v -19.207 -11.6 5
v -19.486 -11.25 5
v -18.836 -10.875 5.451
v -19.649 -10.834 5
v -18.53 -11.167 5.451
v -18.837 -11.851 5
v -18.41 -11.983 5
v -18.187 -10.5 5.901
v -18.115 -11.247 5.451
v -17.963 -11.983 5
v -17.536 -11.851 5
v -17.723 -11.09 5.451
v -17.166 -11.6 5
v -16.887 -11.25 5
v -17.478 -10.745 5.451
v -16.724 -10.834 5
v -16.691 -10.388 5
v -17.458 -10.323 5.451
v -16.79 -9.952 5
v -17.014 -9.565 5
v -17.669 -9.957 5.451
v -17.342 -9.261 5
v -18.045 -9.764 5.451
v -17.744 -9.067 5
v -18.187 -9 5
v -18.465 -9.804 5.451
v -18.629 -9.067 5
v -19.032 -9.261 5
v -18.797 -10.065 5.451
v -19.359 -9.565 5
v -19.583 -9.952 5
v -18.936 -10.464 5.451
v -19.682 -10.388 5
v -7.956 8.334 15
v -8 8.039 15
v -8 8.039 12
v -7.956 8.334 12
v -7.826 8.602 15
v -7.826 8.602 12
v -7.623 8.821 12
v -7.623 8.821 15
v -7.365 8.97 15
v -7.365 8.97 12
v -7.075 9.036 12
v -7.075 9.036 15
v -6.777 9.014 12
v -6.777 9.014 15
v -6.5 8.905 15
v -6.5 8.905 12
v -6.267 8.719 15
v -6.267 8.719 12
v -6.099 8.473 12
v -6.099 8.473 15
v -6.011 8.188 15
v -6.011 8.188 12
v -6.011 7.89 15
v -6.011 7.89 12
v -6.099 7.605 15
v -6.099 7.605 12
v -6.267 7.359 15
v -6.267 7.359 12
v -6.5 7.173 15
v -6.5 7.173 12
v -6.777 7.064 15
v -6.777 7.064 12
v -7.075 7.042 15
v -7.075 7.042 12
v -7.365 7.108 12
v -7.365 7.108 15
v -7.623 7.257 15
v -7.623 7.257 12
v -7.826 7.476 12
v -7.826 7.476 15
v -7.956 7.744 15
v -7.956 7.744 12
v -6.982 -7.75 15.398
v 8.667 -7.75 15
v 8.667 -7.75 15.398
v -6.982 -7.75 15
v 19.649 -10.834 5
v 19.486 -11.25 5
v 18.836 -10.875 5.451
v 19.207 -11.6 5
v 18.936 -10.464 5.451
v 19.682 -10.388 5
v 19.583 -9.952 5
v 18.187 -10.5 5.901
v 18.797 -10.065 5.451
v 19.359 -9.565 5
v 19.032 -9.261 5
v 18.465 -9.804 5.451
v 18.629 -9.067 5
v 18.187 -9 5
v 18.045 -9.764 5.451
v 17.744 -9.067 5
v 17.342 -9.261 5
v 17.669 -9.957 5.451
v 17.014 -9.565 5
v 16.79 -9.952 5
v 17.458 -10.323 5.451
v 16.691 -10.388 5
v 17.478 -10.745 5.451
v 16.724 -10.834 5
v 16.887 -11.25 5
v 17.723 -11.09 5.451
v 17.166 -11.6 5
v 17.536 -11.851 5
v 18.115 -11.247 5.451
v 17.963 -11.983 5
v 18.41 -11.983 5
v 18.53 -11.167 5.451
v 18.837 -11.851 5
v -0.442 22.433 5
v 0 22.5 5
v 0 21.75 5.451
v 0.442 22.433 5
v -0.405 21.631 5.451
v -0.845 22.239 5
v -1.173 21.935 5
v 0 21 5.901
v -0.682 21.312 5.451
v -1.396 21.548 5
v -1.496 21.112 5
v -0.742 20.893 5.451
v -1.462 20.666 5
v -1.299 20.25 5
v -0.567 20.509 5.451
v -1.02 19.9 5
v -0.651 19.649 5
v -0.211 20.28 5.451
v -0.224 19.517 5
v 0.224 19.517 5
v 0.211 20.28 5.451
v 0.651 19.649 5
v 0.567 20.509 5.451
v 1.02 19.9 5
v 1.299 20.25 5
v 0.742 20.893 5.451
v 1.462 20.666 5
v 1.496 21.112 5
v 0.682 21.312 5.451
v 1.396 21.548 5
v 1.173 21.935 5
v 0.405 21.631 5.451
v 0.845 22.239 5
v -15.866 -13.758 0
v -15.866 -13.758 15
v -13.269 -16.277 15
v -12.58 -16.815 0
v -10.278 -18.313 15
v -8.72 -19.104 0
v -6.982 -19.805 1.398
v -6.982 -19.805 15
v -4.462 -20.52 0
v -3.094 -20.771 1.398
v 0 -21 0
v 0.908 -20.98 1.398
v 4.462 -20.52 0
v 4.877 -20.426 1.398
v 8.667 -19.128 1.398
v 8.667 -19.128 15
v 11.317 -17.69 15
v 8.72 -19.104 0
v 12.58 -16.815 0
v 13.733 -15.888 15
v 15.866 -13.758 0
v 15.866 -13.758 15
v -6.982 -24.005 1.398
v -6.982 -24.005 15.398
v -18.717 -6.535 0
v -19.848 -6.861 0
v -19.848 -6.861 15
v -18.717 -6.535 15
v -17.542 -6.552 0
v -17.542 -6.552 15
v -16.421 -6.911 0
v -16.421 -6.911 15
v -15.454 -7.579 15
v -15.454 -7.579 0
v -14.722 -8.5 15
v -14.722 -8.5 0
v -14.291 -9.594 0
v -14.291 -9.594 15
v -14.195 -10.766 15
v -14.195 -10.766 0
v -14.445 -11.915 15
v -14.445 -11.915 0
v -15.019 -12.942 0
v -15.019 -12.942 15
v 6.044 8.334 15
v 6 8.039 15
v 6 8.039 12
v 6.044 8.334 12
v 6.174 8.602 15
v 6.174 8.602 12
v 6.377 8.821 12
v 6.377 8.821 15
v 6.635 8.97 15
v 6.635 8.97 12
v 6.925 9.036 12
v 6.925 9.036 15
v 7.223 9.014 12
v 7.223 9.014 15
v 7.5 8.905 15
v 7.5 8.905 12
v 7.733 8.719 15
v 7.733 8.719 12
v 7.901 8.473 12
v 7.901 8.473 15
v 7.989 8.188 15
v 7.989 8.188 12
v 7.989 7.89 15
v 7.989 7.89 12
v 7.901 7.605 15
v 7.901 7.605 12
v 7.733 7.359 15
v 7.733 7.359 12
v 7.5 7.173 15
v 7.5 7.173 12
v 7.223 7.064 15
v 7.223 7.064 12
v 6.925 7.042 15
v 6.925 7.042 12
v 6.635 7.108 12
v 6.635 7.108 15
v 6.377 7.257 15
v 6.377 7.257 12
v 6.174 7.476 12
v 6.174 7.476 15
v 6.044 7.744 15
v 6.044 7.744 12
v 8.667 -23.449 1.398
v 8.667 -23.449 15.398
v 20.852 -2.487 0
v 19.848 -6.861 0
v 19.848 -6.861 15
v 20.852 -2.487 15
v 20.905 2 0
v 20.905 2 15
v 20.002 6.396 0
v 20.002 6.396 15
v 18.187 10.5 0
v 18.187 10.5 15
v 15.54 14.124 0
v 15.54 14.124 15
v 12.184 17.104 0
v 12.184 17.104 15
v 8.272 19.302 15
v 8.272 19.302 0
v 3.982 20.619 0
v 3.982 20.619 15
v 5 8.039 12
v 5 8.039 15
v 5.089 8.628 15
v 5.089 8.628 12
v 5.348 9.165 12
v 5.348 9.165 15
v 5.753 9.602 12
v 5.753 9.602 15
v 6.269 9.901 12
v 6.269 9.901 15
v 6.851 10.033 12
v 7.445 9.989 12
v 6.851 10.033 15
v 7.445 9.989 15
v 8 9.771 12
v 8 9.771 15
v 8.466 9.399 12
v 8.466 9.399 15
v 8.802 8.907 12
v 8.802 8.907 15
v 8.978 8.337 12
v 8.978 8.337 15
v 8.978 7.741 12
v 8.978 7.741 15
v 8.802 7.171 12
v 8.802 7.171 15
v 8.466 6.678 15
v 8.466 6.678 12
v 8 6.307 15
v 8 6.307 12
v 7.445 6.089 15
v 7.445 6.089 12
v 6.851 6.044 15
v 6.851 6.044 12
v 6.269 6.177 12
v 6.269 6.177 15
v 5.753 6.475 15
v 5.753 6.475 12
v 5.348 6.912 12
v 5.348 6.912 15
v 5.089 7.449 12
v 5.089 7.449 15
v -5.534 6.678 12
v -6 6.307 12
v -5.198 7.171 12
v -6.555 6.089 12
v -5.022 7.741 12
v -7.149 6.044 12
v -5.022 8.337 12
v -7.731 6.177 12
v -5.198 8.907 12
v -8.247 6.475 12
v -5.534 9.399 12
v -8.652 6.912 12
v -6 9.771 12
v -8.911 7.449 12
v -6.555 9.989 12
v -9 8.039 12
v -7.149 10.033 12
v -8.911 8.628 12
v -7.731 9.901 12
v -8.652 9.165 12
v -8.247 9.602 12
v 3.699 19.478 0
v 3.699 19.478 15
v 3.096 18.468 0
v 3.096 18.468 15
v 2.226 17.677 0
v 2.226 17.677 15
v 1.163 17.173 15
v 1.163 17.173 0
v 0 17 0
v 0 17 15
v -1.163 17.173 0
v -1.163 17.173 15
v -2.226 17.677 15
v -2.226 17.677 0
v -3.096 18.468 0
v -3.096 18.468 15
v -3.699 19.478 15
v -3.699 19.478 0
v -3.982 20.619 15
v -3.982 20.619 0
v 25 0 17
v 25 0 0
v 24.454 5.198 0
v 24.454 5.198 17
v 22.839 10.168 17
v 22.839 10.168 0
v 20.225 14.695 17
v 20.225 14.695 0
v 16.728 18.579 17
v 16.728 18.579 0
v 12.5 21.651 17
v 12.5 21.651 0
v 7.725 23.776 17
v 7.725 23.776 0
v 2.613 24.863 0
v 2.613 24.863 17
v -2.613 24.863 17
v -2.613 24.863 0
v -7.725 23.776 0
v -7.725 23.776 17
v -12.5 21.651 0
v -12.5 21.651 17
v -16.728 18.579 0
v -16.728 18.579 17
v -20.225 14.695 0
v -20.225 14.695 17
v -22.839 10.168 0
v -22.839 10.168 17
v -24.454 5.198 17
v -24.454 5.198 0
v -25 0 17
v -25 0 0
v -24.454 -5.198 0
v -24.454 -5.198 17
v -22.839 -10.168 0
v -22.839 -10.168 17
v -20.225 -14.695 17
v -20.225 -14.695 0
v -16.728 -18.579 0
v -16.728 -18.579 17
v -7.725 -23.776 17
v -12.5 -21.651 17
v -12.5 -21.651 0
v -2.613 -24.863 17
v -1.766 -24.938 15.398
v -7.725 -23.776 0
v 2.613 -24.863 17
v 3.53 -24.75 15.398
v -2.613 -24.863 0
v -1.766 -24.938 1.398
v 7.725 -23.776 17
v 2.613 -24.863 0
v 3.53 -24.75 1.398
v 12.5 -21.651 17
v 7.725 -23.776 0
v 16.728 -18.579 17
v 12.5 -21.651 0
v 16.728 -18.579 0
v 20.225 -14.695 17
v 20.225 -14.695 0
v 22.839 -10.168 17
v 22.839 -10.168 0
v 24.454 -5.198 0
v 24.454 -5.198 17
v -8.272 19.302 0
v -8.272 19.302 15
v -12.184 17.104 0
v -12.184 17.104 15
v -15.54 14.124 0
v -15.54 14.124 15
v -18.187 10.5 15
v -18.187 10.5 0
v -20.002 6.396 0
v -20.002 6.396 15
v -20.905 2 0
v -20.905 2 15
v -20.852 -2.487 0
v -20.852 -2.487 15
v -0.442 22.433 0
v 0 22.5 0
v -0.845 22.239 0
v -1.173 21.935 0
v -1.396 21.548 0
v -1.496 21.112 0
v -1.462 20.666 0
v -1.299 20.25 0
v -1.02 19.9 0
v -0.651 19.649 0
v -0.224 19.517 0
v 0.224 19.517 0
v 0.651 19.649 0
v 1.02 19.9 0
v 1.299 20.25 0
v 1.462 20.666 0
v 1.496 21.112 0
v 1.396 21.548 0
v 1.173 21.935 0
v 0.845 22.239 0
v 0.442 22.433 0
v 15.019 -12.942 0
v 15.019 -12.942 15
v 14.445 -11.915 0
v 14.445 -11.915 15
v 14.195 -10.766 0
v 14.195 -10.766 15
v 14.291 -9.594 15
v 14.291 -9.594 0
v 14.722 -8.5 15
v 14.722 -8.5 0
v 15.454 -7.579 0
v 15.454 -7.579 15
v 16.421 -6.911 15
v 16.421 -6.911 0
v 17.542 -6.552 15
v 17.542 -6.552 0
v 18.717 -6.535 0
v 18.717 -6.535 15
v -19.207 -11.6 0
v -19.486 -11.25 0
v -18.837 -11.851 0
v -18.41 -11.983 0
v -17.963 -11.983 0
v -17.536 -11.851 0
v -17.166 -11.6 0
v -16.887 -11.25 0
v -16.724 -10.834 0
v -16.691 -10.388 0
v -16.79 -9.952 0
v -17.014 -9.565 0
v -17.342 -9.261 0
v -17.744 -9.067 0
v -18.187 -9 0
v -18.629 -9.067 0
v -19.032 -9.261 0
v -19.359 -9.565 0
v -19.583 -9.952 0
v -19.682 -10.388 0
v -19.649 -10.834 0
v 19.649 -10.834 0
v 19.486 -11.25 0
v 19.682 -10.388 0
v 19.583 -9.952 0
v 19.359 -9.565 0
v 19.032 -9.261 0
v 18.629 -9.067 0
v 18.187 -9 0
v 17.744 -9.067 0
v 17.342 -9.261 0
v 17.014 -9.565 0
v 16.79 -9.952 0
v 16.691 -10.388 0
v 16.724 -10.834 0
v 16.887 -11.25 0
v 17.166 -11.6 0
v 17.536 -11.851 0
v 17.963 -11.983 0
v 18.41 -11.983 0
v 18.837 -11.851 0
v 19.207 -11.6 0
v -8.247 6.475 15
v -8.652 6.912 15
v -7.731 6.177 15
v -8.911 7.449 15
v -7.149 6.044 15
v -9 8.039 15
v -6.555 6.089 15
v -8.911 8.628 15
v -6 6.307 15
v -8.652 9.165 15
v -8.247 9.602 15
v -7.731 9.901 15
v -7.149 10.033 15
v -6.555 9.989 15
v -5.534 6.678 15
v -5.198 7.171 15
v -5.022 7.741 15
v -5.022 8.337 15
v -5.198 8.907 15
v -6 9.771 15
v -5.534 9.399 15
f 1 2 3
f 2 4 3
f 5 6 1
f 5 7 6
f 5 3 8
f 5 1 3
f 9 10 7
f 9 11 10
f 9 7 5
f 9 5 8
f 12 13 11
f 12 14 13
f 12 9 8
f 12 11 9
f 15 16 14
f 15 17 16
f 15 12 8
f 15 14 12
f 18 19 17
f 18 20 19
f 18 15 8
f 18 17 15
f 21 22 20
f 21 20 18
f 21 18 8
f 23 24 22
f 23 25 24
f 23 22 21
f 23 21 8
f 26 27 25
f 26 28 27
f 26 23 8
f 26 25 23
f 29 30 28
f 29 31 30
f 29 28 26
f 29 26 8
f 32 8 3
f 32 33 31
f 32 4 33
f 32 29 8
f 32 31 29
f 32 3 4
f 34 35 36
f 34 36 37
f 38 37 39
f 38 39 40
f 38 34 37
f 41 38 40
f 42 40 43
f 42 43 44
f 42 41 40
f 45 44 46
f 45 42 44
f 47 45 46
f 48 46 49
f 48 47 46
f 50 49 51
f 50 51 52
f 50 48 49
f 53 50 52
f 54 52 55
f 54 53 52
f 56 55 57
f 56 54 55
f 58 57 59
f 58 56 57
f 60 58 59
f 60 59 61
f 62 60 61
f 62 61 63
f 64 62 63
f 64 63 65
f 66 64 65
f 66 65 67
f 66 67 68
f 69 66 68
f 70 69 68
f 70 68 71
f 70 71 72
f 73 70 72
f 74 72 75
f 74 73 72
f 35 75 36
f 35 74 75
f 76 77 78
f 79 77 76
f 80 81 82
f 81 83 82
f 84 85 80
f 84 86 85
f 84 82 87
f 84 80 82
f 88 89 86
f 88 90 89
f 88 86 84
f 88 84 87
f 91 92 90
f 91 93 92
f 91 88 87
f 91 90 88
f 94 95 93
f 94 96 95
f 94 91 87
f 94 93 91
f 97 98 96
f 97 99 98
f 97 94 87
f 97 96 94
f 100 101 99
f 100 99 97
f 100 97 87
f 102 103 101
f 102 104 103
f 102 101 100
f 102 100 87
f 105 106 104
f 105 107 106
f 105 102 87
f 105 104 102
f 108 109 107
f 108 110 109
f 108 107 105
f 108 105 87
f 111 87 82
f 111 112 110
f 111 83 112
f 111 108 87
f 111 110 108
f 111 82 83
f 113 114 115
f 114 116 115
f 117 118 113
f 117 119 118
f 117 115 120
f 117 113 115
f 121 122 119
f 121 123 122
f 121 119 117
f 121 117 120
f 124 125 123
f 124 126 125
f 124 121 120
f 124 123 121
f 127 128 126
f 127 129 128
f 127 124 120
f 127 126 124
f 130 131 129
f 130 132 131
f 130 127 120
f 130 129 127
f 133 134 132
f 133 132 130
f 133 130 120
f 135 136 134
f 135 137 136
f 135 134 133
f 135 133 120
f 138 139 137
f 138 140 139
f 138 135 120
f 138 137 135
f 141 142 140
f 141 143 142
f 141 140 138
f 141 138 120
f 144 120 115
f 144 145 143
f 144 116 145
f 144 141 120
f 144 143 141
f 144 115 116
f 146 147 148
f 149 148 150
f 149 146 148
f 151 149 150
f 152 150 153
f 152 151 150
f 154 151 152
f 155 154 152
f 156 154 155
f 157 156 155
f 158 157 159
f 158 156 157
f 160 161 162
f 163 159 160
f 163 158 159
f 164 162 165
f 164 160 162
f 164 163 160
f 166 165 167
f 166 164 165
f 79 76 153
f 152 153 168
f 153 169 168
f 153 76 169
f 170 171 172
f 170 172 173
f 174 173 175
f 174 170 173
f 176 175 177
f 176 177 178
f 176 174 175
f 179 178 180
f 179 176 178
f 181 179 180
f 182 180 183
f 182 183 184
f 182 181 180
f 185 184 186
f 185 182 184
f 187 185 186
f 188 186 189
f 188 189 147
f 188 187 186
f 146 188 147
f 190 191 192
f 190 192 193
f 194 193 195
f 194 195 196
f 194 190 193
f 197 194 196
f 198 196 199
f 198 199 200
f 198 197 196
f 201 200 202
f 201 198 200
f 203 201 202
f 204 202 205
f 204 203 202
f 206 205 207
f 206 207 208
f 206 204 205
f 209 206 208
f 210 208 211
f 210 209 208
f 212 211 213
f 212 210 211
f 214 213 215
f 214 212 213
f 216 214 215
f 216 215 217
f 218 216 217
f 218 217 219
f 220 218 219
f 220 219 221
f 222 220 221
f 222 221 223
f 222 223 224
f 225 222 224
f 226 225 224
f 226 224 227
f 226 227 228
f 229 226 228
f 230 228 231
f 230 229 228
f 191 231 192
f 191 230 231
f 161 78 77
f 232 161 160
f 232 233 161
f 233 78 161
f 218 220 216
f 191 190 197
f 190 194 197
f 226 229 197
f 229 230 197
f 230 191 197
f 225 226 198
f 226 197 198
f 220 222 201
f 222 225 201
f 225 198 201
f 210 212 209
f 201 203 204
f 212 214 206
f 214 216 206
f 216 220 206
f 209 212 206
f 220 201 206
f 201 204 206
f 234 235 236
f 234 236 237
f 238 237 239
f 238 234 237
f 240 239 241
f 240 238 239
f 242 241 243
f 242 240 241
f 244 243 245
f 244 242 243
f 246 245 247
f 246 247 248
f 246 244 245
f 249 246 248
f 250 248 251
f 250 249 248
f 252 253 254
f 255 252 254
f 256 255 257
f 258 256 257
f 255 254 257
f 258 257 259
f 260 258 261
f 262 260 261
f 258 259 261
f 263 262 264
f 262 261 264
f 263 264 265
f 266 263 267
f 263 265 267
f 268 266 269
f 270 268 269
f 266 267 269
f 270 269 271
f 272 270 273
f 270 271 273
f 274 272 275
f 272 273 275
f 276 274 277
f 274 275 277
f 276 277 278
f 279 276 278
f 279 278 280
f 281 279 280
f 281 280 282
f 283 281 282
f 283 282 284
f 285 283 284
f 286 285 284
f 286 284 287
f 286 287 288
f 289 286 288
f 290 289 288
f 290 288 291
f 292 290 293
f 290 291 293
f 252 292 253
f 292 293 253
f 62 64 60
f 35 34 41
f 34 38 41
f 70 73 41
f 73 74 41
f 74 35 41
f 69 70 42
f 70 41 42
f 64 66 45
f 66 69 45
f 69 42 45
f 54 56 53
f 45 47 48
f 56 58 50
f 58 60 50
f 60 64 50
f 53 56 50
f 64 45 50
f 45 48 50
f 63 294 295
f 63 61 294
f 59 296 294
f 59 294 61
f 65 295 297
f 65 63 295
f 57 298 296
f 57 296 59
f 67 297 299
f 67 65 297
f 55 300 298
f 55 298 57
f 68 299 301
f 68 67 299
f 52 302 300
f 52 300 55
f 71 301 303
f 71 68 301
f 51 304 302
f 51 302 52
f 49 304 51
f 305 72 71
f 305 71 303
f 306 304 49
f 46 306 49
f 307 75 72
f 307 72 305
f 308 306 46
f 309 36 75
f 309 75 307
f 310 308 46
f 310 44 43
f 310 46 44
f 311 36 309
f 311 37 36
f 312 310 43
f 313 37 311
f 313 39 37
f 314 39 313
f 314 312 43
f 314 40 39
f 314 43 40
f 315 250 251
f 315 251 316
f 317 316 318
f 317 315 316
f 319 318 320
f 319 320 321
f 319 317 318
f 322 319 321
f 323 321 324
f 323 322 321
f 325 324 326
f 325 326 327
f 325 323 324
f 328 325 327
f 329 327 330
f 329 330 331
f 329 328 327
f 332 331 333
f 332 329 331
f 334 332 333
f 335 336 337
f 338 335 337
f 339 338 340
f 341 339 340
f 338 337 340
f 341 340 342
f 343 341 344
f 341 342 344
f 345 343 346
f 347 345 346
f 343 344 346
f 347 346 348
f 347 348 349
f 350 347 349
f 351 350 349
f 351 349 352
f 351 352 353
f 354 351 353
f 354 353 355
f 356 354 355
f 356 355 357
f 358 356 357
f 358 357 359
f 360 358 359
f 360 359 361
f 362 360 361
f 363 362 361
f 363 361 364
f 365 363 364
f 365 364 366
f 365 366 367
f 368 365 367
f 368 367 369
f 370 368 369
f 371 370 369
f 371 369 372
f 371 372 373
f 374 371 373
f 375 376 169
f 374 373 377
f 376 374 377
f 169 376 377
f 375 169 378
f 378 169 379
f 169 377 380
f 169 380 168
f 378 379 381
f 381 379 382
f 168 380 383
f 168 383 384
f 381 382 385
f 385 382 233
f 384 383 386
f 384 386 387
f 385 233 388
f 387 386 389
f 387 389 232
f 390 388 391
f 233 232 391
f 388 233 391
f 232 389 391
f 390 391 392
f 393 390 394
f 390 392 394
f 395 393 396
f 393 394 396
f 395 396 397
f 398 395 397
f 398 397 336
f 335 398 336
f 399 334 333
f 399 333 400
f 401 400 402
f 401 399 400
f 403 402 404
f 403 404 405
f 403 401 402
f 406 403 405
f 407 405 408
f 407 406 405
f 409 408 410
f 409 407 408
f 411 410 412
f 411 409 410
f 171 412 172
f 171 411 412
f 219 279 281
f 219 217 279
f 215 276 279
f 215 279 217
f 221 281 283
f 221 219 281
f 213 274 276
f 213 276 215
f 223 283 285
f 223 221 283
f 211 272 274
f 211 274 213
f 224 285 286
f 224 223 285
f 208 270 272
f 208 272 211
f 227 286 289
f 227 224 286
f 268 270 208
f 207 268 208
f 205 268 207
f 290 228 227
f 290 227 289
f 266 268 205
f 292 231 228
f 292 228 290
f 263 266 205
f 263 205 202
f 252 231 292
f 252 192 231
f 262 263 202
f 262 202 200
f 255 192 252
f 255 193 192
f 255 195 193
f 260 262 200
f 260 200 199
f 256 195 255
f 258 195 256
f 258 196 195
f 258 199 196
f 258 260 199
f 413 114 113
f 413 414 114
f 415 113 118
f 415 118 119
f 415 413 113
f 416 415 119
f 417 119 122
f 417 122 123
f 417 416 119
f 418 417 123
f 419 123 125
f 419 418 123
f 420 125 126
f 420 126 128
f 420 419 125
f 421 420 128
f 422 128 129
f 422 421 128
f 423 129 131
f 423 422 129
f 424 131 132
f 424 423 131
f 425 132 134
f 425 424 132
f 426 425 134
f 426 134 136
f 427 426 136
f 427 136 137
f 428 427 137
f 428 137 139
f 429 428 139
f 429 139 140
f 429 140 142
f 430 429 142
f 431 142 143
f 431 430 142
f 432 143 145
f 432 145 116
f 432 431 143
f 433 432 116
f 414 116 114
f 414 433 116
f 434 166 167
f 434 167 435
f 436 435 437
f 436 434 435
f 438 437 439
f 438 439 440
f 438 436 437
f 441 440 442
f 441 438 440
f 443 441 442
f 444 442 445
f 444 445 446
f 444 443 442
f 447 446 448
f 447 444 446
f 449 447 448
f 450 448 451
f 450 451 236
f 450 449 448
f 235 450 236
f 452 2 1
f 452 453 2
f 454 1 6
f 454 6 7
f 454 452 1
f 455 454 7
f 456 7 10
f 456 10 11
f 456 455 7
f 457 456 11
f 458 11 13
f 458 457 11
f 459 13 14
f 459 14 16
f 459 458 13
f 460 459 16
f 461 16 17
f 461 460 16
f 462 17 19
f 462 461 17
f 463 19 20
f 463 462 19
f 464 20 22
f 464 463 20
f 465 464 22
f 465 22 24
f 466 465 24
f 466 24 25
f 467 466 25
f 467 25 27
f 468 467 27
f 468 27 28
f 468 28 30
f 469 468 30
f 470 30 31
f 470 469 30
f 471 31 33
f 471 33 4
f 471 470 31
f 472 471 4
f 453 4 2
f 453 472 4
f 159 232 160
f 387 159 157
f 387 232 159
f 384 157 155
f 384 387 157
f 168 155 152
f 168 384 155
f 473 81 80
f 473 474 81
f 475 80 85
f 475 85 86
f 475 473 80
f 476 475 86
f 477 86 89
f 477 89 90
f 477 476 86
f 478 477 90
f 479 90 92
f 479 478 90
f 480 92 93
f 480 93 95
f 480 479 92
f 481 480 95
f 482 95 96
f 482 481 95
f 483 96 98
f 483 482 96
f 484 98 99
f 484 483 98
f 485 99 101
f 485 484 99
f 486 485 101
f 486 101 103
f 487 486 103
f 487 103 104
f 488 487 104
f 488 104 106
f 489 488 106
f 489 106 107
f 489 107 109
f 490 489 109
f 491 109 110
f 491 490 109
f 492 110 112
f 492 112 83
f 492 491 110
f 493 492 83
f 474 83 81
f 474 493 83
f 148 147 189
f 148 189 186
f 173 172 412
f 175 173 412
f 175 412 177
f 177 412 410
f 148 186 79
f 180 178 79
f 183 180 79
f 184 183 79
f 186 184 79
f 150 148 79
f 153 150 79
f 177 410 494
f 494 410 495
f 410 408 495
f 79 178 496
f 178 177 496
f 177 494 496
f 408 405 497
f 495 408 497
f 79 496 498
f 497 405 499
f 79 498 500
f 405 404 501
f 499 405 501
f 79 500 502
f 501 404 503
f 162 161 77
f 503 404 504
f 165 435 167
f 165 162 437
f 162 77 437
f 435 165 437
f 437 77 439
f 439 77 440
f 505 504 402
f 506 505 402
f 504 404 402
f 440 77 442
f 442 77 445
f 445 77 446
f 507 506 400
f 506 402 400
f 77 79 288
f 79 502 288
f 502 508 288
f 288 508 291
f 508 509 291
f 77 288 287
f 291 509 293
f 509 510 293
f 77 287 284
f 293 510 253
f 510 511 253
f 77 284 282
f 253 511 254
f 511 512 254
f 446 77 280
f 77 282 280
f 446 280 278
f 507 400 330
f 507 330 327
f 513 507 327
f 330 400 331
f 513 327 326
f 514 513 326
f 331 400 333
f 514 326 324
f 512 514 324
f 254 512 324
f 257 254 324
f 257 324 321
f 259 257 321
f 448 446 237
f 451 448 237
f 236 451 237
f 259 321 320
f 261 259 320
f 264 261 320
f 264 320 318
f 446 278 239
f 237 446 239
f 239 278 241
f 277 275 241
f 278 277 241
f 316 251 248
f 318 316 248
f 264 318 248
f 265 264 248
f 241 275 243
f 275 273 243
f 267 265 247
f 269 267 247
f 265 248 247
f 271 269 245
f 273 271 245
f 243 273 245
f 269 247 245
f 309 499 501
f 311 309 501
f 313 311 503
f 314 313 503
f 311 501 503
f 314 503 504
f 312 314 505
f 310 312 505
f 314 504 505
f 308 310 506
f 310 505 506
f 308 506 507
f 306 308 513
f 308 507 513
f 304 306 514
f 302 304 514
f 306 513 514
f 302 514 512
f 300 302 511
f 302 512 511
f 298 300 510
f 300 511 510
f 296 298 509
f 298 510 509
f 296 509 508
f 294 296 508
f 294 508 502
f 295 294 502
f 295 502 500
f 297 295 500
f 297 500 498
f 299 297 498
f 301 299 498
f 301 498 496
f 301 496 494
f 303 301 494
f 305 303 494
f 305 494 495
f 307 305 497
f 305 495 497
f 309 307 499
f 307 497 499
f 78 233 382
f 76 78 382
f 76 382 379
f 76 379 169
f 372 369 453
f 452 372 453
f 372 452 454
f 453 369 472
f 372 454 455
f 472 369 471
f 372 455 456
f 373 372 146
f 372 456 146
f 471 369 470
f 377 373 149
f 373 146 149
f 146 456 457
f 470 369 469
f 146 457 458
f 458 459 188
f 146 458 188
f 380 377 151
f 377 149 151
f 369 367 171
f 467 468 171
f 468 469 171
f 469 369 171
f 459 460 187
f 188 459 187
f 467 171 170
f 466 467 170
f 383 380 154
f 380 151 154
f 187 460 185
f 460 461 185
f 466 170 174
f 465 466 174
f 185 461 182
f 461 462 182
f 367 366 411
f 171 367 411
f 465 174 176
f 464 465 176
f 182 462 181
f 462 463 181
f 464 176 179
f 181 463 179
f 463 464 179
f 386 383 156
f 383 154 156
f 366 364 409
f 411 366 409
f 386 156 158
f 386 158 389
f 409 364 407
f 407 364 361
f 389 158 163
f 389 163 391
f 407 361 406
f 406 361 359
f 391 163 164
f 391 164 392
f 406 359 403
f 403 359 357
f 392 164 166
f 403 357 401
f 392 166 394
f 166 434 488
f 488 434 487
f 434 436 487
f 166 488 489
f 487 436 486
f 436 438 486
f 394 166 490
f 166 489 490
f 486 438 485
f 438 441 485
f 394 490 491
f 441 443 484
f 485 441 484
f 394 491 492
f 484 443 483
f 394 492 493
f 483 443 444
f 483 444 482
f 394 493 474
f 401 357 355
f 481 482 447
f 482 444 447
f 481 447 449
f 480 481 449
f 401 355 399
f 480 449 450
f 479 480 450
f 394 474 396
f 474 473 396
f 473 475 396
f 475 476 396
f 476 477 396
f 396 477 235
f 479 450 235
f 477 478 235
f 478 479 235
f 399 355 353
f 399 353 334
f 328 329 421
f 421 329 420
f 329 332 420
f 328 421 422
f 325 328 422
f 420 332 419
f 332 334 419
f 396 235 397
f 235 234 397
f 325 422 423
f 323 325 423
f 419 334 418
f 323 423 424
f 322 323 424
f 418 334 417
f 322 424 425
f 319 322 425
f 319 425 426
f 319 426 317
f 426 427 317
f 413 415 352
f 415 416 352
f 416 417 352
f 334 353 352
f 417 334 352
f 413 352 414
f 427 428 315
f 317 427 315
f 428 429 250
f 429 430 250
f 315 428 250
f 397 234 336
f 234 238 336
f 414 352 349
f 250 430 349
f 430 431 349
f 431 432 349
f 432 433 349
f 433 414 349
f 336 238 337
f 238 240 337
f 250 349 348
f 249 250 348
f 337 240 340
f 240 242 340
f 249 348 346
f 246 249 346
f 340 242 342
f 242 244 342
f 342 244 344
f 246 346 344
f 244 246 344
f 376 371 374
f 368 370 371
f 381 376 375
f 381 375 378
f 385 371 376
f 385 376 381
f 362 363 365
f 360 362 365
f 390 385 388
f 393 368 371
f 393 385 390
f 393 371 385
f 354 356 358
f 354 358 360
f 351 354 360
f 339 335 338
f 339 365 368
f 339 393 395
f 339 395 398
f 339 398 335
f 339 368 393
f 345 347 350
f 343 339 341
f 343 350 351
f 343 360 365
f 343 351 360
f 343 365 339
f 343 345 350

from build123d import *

# Parameters (mm, degrees)
SKETCH1_R           = 25
BOSS_EXTRUDE1_DEPTH = 17
CIRPATTERN1_COUNT   = 3
SKETCH14_W          = 15.649879363
SKETCH14_H          = 14
CUT_EXTRUDE2_DEPTH  = 17.25
CUT_EXTRUDE3_DEPTH  = 15
SKETCH16_R          = 2
SKETCH16_R_2        = 1
BOSS_EXTRUDE2_DEPTH = 3


with BuildPart() as part:
    # Sketch1 → Boss-Extrude1 (new body)
    with BuildSketch(Plane.XY):
        Circle(SKETCH1_R)
    extrude(amount=BOSS_EXTRUDE1_DEPTH)

    # Sketch12 → Ø3.0mm Dowel Hole1 (revolve, cut)
    with BuildSketch(Plane(origin=(0, 21, 0), x_dir=(0, 1, 0), z_dir=(1, 0, 0))):
        Polygon((0, 0), (0, 5.901290929), (1.5, 5), (1.5, 0), align=None)
    f_3_0mm_dowel_hole1 = revolve(axis=Axis((0, 21, -6.35), (0, 0, 1)), mode=Mode.SUBTRACT)

    # CirPattern1: Ø3.0mm Dowel Hole1 ×3 about axis
    cirpattern1_axis = Axis((0, 0, 0), (0, 0, 1))
    for i in range(1, CIRPATTERN1_COUNT):
        add(f_3_0mm_dowel_hole1.rotate(cirpattern1_axis, i * 360 / CIRPATTERN1_COUNT), mode=Mode.SUBTRACT)

    # Sketch14 → Cut-Extrude2 (cut)
    with BuildSketch(Plane(origin=(0, -25, 0), x_dir=(-1, 0, 0), z_dir=(0, -1, 0))):
        with Locations((-0.842506508, -8.397851159)):
            Rectangle(SKETCH14_W, SKETCH14_H)
    extrude(amount=-CUT_EXTRUDE2_DEPTH, mode=Mode.SUBTRACT)

    # Sketch15 → Cut-Extrude3 (cut)
    with BuildSketch(Plane(origin=(0, 0, 0), x_dir=(-1, 0, 0), z_dir=(0, 0, -1))):
        with BuildLine():
            ThreePointArc((-3.981818088, 20.619047619), (0, 17), (3.981818088, 20.619047619))
            ThreePointArc((3.981818088, 20.619047619), (18.186533479, 10.5), (19.847528084, -6.861168192))
            ThreePointArc((19.847528084, -6.861168192), (14.722431864, -8.5), (15.865709996, -13.757879427))
            ThreePointArc((15.865709996, -13.757879427), (0, -21), (-15.865709996, -13.757879427))
            ThreePointArc((-15.865709996, -13.757879427), (-14.722431864, -8.5), (-19.847528084, -6.861168192))
            ThreePointArc((-19.847528084, -6.861168192), (-18.186533479, 10.5), (-3.981818088, 20.619047619))
        make_face()
    extrude(amount=-CUT_EXTRUDE3_DEPTH, mode=Mode.SUBTRACT)

    # Sketch16 → Boss-Extrude2 (add)
    with BuildSketch(Plane(origin=(0, 0, 15), x_dir=(-1, 0, 0), z_dir=(0, 0, -1))):
        with Locations((-7, 8.038832814)):
            Circle(SKETCH16_R)
        with Locations((-7, 8.038832814)):
            Circle(SKETCH16_R_2, mode=Mode.SUBTRACT)
        with Locations((7, 8.038832814)):
            Circle(SKETCH16_R)
        with Locations((7, 8.038832814)):
            Circle(SKETCH16_R_2, mode=Mode.SUBTRACT)
    extrude(amount=BOSS_EXTRUDE2_DEPTH)


solid = part.part
